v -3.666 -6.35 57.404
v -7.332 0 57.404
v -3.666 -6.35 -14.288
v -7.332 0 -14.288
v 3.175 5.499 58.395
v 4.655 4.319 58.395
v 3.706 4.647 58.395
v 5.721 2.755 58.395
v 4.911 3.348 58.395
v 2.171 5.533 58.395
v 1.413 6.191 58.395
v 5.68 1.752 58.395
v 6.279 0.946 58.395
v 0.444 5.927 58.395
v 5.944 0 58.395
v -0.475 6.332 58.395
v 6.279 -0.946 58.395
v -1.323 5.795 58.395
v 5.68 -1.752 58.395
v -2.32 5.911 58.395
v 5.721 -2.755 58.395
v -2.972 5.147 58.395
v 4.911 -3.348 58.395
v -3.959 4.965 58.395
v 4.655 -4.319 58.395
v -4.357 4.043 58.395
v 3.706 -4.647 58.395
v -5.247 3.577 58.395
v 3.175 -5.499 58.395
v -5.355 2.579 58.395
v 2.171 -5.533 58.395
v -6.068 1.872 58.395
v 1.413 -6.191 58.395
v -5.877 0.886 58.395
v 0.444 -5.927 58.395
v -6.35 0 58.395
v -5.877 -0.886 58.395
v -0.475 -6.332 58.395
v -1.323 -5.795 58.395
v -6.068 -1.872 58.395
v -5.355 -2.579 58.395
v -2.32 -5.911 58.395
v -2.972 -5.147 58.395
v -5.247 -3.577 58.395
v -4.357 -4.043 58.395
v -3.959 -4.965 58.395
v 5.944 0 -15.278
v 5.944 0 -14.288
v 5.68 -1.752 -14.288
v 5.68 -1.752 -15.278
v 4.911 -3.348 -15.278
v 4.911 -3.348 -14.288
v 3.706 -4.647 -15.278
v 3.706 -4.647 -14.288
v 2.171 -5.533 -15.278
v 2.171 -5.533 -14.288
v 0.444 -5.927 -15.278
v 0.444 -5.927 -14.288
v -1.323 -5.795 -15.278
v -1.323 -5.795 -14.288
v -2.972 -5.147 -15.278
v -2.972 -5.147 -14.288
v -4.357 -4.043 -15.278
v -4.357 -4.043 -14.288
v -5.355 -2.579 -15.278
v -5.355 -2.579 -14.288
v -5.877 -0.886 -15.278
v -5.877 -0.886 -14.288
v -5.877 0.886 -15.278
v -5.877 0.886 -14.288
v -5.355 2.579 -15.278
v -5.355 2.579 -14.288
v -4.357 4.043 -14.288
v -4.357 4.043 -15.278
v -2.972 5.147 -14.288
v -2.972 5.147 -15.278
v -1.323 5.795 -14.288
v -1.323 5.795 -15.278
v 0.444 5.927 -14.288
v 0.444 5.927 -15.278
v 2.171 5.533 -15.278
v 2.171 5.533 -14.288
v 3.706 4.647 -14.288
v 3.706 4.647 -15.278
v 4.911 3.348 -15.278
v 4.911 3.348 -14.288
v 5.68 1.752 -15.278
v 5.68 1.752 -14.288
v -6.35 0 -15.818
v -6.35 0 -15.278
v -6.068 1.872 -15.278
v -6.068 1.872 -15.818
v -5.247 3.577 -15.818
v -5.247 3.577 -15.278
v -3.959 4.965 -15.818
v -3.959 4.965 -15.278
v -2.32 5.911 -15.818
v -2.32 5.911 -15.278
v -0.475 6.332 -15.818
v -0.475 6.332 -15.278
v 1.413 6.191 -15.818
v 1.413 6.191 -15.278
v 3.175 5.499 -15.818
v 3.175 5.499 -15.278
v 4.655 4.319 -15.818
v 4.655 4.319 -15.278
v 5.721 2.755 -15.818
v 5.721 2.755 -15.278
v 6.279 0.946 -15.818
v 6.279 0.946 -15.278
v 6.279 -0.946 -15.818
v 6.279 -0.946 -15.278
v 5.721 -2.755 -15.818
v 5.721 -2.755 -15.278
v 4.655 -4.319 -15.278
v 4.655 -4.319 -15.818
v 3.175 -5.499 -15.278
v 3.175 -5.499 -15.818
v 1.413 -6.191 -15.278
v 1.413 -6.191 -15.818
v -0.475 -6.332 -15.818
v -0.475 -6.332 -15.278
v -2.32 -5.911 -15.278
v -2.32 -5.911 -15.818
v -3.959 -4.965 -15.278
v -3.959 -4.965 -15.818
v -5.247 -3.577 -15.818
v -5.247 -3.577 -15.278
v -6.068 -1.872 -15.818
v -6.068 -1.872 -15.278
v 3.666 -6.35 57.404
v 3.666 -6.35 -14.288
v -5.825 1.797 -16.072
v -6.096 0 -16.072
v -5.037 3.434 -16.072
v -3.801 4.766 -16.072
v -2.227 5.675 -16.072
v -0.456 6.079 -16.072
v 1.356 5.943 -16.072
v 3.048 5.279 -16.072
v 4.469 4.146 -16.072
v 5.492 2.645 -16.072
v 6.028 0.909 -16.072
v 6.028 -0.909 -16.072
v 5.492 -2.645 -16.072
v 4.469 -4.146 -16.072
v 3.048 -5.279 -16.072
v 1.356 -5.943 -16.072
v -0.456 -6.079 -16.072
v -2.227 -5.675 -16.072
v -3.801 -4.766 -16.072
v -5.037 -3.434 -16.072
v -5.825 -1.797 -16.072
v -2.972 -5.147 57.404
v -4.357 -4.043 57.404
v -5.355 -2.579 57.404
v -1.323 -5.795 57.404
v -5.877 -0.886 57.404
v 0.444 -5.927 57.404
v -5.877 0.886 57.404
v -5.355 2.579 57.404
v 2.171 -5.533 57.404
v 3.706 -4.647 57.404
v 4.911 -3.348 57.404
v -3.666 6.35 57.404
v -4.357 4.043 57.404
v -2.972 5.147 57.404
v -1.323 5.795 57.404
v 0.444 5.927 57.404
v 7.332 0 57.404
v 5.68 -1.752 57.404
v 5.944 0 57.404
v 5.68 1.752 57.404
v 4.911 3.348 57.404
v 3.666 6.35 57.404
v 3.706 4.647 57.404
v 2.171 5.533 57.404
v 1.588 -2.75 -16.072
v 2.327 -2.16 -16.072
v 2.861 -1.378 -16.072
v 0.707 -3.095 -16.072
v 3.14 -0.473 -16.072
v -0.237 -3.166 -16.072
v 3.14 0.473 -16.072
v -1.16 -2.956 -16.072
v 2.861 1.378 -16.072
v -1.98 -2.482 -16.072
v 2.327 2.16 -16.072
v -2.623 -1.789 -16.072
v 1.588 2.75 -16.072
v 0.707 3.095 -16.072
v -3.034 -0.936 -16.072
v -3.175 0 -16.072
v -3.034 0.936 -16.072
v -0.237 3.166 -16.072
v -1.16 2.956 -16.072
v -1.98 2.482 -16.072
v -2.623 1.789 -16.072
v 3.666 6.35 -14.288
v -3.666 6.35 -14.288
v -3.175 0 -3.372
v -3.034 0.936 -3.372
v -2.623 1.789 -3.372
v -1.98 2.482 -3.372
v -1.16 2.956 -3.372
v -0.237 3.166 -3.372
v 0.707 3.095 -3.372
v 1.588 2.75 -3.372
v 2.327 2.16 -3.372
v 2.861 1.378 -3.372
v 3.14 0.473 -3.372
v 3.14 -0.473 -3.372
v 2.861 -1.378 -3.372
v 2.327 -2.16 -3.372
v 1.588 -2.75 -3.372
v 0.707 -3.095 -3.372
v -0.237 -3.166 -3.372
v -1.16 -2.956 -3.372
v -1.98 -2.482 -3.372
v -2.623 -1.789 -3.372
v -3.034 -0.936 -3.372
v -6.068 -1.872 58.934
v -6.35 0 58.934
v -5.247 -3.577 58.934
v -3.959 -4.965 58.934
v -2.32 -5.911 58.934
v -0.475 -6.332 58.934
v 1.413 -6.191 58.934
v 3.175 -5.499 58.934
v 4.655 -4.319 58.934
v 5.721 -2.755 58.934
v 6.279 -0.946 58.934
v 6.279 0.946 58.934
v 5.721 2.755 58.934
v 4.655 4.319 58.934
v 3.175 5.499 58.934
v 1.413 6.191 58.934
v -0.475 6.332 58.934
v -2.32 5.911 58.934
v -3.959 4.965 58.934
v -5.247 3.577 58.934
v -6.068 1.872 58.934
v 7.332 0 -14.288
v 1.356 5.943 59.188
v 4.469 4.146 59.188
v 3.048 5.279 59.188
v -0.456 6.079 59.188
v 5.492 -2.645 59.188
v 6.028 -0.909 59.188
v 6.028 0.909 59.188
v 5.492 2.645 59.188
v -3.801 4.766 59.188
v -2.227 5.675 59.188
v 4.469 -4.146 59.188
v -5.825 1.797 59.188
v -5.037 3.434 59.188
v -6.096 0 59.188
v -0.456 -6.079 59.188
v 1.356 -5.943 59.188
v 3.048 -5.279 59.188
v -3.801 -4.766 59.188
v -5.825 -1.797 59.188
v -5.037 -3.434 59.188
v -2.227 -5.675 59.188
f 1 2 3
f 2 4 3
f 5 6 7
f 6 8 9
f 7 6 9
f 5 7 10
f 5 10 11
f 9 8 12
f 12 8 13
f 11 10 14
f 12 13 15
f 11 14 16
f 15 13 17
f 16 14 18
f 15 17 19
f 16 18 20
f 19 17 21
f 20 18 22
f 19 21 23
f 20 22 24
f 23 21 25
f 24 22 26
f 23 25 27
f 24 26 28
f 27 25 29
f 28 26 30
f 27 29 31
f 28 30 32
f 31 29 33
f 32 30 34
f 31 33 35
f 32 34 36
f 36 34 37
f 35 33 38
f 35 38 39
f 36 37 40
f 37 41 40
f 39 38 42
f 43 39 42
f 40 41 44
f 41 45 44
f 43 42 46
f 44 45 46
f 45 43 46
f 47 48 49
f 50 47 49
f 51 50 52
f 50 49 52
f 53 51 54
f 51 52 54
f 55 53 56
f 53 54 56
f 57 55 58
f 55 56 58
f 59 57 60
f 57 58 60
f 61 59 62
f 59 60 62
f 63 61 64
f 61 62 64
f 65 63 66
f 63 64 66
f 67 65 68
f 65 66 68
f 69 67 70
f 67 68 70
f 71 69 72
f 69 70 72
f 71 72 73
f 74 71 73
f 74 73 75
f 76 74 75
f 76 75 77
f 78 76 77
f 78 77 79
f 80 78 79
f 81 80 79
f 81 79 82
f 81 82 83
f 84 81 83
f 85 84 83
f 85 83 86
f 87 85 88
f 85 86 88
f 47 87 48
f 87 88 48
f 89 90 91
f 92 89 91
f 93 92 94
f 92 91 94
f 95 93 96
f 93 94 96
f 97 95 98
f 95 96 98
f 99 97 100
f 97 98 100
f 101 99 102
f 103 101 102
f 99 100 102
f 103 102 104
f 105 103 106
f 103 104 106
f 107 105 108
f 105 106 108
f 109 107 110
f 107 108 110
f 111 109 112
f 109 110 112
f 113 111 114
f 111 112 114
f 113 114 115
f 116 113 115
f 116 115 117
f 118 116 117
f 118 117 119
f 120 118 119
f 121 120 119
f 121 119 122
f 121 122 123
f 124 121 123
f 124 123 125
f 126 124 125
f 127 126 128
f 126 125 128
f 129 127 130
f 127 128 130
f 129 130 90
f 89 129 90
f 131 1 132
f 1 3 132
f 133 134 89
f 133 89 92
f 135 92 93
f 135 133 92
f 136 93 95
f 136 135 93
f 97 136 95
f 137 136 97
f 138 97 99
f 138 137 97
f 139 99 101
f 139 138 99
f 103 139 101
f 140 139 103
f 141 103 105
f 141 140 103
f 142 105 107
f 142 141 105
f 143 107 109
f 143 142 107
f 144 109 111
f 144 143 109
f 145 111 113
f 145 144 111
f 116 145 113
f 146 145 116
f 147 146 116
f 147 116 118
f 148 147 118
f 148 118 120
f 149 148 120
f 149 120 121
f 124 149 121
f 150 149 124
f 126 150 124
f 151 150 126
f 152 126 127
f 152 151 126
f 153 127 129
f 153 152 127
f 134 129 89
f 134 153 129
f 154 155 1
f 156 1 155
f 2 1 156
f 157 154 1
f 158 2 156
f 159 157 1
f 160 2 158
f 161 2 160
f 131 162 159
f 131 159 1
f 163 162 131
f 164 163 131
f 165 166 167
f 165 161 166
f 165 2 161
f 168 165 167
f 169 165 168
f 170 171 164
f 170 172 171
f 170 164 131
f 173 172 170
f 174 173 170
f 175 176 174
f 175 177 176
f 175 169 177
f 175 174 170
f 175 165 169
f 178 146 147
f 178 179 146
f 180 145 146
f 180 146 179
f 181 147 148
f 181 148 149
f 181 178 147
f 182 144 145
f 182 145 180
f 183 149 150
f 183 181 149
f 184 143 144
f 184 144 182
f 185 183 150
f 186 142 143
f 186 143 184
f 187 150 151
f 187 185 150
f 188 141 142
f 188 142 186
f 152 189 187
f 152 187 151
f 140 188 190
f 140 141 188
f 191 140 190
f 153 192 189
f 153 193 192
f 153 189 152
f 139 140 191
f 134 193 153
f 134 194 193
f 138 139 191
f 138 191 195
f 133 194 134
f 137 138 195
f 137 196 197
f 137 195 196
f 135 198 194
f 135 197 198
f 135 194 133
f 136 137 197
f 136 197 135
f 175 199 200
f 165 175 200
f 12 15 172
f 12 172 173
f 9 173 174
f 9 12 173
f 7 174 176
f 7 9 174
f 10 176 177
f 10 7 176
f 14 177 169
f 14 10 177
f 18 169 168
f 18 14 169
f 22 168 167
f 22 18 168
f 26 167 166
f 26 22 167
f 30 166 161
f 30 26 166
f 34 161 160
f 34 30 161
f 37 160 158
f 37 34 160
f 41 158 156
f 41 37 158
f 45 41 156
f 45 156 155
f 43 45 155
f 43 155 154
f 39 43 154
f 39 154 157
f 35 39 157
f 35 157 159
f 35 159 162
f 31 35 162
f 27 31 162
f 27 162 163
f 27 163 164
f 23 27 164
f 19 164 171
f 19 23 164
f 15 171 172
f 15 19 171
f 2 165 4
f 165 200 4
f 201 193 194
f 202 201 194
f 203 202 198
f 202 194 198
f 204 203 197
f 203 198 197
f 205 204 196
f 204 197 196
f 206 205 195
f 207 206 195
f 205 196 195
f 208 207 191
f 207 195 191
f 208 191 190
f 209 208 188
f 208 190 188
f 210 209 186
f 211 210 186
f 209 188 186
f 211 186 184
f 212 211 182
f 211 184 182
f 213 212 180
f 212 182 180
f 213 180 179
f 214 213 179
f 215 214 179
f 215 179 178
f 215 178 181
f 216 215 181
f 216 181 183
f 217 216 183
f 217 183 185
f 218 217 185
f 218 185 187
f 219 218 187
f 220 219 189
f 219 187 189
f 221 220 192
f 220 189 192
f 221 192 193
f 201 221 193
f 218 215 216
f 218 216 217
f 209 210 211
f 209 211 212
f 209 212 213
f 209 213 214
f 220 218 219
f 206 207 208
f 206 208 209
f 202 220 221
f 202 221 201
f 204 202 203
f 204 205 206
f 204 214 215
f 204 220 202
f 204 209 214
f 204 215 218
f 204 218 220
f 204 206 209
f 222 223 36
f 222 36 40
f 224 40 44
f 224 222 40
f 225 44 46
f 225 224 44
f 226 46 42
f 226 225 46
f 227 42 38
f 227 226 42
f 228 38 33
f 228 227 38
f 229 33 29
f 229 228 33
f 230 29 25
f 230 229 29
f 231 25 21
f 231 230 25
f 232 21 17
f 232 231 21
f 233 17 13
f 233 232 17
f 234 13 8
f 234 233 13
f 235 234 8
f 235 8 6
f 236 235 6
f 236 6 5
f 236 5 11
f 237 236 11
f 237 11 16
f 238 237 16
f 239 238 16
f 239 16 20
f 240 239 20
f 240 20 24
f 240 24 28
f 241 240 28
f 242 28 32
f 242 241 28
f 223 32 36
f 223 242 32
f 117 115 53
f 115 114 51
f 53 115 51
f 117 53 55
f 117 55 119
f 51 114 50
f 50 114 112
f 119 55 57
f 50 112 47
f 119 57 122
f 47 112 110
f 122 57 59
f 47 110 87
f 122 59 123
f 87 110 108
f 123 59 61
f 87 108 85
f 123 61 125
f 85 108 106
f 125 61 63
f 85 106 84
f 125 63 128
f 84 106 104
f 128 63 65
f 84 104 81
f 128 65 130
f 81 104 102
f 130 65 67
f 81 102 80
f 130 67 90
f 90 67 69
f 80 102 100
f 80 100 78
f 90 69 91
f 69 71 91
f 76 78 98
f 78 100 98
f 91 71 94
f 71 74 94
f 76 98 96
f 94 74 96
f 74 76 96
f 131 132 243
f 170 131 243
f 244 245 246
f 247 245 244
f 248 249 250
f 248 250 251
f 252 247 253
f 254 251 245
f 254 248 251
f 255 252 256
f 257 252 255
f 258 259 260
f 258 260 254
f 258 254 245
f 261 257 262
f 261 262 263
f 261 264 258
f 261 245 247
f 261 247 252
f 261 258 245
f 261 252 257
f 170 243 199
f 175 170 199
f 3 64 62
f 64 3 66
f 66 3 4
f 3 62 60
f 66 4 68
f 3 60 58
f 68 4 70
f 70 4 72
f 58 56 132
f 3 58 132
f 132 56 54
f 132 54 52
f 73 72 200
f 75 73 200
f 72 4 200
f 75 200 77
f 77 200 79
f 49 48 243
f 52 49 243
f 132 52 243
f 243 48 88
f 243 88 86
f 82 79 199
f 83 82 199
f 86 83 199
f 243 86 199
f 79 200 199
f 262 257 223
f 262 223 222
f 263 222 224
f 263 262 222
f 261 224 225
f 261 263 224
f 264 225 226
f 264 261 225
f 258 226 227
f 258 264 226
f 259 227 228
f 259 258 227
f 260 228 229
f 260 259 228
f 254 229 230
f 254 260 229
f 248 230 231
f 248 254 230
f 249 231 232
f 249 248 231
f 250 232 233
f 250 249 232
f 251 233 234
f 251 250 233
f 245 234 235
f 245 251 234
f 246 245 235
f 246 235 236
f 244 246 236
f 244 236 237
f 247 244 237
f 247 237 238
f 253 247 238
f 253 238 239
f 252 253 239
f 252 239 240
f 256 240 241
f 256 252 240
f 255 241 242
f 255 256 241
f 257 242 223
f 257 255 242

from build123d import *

# Parameters (mm, degrees)
BOSS_EXTRUDE1_DEPTH = 14.2875
SKETCH2_R           = 5.9436
BOSS_EXTRUDE2_DEPTH = 0.9906
SKETCH3_R           = 6.35
BOSS_EXTRUDE3_DEPTH = 0.79375
CHAMFER1_SIZE       = 0.254
SKETCH4_R           = 3.175
CUT_EXTRUDE1_DEPTH  = 12.7
BOSS_EXTRUDE4_DEPTH = 43.1165
BOSS_EXTRUDE5_START = 0.9906
SKETCH6_R           = 5.9436
BOSS_EXTRUDE5_DEPTH = 0.9906
BOSS_EXTRUDE6_START = 0.79375
SKETCH7_R           = 6.35
BOSS_EXTRUDE6_DEPTH = 0.79375
CHAMFER2_SIZE       = 0.254


with BuildPart() as part:
    # Sketch1 → Boss-Extrude1 (new, symmetric)
    with BuildSketch(Plane.XY):
        Polygon((7.332348419, 0), (3.666174209, 6.35), (-3.666174209, 6.35), (-7.332348419, 0), (-3.666174209, -6.35), (3.666174209, -6.35), align=None)
    extrude(amount=BOSS_EXTRUDE1_DEPTH, both=True)

    # Sketch2 → Boss-Extrude2 (add)
    with BuildSketch(Plane(origin=(0, 0, -14.2875), x_dir=(-1, 0, 0), z_dir=(0, 0, -1))):
        with Locations(Location((0, 0, 0), (0, 0, 180))):
            Circle(SKETCH2_R)
    extrude(amount=BOSS_EXTRUDE2_DEPTH)

    # Sketch3 → Boss-Extrude3 (add)
    with BuildSketch(Plane(origin=(0, 0, -15.2781), x_dir=(-1, 0, 0), z_dir=(0, 0, -1))):
        Circle(SKETCH3_R)
    extrude(amount=BOSS_EXTRUDE3_DEPTH)

    # Chamfer1
    chamfer1_edges = [part.edges().sort_by_distance(p)[0] for p in [
        (6.35, 0, -16.07185),
    ]]
    chamfer(chamfer1_edges, length=CHAMFER1_SIZE)

    # Sketch4 → Cut-Extrude1 (cut)
    with BuildSketch(Plane(origin=(0, 0, -16.07185), x_dir=(-1, 0, 0), z_dir=(0, 0, -1))):
        Circle(SKETCH4_R)
    extrude(amount=-CUT_EXTRUDE1_DEPTH, mode=Mode.SUBTRACT)

    # Sketch5 → Boss-Extrude4 (add)
    with BuildSketch(Plane.XY.offset(14.2875)):
        Polygon((3.666174209, 6.35), (-3.666174209, 6.35), (-7.332348419, 0), (-3.666174209, -6.35), (3.666174209, -6.35), (7.332348419, 0), align=None)
    extrude(amount=BOSS_EXTRUDE4_DEPTH)

    # Sketch6 → Boss-Extrude5 (add)
    with BuildSketch(Plane.XY.offset(57.404).offset(BOSS_EXTRUDE5_START)):
        Circle(SKETCH6_R)
    extrude(amount=-BOSS_EXTRUDE5_DEPTH)

    # Sketch7 → Boss-Extrude6 (add)
    with BuildSketch(Plane.XY.offset(58.3946).offset(BOSS_EXTRUDE6_START)):
        with Locations(Location((0, 0, 0), (0, 0, 180))):
            Circle(SKETCH7_R)
    extrude(amount=-BOSS_EXTRUDE6_DEPTH)

    # Chamfer2
    chamfer2_edges = [part.edges().sort_by_distance(p)[0] for p in [
        (6.35, 0, 59.18835),
    ]]
    chamfer(chamfer2_edges, length=CHAMFER2_SIZE)


solid = part.part
